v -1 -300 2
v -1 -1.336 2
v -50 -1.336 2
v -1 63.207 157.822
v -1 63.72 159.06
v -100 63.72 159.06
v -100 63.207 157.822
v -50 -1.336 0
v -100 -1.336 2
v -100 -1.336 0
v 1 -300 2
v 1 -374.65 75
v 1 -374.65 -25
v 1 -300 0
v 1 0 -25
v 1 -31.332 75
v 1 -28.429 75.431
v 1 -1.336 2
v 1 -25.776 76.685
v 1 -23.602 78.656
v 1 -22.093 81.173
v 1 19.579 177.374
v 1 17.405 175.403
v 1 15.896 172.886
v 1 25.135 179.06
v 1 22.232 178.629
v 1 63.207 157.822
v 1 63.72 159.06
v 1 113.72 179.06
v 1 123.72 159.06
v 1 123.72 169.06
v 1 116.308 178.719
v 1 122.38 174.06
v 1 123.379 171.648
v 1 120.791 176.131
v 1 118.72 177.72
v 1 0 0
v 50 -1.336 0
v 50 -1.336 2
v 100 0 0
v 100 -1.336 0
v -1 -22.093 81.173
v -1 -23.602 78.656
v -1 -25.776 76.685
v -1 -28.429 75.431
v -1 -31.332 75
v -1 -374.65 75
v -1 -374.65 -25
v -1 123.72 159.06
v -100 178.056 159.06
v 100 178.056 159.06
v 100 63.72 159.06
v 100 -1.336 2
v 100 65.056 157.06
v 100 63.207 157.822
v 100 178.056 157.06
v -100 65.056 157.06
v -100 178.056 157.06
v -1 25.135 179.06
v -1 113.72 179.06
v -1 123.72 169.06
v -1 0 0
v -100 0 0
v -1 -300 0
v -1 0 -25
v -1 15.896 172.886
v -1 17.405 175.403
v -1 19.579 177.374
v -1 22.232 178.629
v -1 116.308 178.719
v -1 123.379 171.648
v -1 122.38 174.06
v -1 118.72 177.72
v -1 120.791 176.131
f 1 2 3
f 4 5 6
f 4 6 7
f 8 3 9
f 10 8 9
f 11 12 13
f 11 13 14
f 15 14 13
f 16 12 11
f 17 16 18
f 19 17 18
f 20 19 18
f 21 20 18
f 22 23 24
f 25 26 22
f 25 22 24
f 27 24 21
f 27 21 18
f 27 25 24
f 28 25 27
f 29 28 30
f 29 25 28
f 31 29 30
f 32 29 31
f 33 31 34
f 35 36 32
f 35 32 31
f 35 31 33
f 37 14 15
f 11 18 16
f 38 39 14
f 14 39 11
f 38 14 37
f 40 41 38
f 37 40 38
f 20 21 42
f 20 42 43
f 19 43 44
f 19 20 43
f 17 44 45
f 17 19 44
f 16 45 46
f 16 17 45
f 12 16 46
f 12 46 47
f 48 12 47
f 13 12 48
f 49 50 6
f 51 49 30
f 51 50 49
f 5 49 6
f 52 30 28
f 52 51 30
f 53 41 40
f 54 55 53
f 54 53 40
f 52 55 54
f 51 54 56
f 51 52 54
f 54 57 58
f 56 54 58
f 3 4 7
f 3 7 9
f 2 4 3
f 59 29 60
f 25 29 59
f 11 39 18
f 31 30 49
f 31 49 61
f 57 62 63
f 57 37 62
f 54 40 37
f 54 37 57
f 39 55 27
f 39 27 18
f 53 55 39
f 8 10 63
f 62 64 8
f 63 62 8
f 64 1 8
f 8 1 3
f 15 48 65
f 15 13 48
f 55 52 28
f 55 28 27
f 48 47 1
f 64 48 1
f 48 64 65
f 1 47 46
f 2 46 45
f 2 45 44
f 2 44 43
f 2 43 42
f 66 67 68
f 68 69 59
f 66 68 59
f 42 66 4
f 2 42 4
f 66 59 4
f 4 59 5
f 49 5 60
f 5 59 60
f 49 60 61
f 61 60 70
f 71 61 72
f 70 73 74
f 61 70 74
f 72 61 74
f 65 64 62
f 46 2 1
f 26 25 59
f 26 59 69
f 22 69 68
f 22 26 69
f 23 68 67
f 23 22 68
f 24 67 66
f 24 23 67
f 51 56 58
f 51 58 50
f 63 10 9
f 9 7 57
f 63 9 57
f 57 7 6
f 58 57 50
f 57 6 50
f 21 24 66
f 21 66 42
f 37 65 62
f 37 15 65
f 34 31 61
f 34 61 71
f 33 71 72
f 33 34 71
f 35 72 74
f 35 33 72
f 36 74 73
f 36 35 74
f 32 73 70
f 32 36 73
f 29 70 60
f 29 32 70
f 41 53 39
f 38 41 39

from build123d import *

# Parameters (mm, degrees)
F1_DEPTH = 100
F3_DEPTH = 2
F4_W     = 2
F4_H     = 298.6636427242
F5_DEPTH = 2
F7_DEPTH = 1


with BuildPart() as f1:
    # F0 (on Right) → F1 (new body, symmetric)
    with BuildSketch(Plane.YZ):
        Polygon((-300, 0), (0, 0), (65.0561835021, 157.0595205269), (178.0561835021, 157.0595205269), (178.0561835021, 159.0595205269), (63.7198262262, 159.0595205269), (63.2071728736, 157.8218658503), (-1.3363572758, 2), (-300, 2), align=None)
    extrude(amount=F1_DEPTH, both=True)

    # F2 (on face) → F3 (cut)
    with BuildSketch(Plane.XY.offset(2)):
        Polygon((-50, -1.3363572758), (-100, -1.3363572758), (-100, -300), (-1, -300), align=None)
        Polygon((100, -300), (100, -1.3363572758), (50, -1.3363572758), (1, -300), align=None)
    extrude(amount=-F3_DEPTH, mode=Mode.SUBTRACT)

    # F4 (on face) → F5 (cut)
    with BuildSketch(Plane.XY.offset(2)):
        with Locations((0, -150.6681786379)):
            Rectangle(F4_W, F4_H)
    extrude(amount=-F5_DEPTH, mode=Mode.SUBTRACT)

    # F6 (on Right) → F7 (join, symmetric)
    with BuildSketch(Plane.YZ):
        with BuildLine():
            Line((0, -25), (0, 0))
            Line((0, 0), (-1.3218912033, 0))
            Line((-1.3218912033, 0), (-1.3218912033, 1.994008737))
            Line((-1.3218912033, 1.994008737), (63.7198262262, 159.0595205269))
            Line((63.7198262262, 159.0595205269), (123.7198262262, 159.0595205269))
            Line((123.7198262262, 159.0595205269), (123.7198262262, 169.0595205269))
            ThreePointArc((123.7198262262, 169.0595205269), (120.7908940381, 176.1305883388), (113.7198262262, 179.0595205269))
            Line((113.7198262262, 179.0595205269), (25.1346510755, 179.0595205269))
            ThreePointArc((25.1346510755, 179.0595205269), (19.5789487453, 177.3742166499), (15.8958557504, 172.8863548506))
            Line((15.8958557504, 172.8863548506), (-22.0929910541, 81.1731656763))
            ThreePointArc((-22.0929910541, 81.1731656763), (-25.776084049, 76.685303877), (-31.3317863792, 75))
            Line((-31.3317863792, 75), (-374.65, 75))
            Line((-374.65, 75), (-374.65, -25))
            Line((-374.65, -25), (0, -25))
        make_face()
    extrude(amount=F7_DEPTH, both=True)


solid = f1.part
